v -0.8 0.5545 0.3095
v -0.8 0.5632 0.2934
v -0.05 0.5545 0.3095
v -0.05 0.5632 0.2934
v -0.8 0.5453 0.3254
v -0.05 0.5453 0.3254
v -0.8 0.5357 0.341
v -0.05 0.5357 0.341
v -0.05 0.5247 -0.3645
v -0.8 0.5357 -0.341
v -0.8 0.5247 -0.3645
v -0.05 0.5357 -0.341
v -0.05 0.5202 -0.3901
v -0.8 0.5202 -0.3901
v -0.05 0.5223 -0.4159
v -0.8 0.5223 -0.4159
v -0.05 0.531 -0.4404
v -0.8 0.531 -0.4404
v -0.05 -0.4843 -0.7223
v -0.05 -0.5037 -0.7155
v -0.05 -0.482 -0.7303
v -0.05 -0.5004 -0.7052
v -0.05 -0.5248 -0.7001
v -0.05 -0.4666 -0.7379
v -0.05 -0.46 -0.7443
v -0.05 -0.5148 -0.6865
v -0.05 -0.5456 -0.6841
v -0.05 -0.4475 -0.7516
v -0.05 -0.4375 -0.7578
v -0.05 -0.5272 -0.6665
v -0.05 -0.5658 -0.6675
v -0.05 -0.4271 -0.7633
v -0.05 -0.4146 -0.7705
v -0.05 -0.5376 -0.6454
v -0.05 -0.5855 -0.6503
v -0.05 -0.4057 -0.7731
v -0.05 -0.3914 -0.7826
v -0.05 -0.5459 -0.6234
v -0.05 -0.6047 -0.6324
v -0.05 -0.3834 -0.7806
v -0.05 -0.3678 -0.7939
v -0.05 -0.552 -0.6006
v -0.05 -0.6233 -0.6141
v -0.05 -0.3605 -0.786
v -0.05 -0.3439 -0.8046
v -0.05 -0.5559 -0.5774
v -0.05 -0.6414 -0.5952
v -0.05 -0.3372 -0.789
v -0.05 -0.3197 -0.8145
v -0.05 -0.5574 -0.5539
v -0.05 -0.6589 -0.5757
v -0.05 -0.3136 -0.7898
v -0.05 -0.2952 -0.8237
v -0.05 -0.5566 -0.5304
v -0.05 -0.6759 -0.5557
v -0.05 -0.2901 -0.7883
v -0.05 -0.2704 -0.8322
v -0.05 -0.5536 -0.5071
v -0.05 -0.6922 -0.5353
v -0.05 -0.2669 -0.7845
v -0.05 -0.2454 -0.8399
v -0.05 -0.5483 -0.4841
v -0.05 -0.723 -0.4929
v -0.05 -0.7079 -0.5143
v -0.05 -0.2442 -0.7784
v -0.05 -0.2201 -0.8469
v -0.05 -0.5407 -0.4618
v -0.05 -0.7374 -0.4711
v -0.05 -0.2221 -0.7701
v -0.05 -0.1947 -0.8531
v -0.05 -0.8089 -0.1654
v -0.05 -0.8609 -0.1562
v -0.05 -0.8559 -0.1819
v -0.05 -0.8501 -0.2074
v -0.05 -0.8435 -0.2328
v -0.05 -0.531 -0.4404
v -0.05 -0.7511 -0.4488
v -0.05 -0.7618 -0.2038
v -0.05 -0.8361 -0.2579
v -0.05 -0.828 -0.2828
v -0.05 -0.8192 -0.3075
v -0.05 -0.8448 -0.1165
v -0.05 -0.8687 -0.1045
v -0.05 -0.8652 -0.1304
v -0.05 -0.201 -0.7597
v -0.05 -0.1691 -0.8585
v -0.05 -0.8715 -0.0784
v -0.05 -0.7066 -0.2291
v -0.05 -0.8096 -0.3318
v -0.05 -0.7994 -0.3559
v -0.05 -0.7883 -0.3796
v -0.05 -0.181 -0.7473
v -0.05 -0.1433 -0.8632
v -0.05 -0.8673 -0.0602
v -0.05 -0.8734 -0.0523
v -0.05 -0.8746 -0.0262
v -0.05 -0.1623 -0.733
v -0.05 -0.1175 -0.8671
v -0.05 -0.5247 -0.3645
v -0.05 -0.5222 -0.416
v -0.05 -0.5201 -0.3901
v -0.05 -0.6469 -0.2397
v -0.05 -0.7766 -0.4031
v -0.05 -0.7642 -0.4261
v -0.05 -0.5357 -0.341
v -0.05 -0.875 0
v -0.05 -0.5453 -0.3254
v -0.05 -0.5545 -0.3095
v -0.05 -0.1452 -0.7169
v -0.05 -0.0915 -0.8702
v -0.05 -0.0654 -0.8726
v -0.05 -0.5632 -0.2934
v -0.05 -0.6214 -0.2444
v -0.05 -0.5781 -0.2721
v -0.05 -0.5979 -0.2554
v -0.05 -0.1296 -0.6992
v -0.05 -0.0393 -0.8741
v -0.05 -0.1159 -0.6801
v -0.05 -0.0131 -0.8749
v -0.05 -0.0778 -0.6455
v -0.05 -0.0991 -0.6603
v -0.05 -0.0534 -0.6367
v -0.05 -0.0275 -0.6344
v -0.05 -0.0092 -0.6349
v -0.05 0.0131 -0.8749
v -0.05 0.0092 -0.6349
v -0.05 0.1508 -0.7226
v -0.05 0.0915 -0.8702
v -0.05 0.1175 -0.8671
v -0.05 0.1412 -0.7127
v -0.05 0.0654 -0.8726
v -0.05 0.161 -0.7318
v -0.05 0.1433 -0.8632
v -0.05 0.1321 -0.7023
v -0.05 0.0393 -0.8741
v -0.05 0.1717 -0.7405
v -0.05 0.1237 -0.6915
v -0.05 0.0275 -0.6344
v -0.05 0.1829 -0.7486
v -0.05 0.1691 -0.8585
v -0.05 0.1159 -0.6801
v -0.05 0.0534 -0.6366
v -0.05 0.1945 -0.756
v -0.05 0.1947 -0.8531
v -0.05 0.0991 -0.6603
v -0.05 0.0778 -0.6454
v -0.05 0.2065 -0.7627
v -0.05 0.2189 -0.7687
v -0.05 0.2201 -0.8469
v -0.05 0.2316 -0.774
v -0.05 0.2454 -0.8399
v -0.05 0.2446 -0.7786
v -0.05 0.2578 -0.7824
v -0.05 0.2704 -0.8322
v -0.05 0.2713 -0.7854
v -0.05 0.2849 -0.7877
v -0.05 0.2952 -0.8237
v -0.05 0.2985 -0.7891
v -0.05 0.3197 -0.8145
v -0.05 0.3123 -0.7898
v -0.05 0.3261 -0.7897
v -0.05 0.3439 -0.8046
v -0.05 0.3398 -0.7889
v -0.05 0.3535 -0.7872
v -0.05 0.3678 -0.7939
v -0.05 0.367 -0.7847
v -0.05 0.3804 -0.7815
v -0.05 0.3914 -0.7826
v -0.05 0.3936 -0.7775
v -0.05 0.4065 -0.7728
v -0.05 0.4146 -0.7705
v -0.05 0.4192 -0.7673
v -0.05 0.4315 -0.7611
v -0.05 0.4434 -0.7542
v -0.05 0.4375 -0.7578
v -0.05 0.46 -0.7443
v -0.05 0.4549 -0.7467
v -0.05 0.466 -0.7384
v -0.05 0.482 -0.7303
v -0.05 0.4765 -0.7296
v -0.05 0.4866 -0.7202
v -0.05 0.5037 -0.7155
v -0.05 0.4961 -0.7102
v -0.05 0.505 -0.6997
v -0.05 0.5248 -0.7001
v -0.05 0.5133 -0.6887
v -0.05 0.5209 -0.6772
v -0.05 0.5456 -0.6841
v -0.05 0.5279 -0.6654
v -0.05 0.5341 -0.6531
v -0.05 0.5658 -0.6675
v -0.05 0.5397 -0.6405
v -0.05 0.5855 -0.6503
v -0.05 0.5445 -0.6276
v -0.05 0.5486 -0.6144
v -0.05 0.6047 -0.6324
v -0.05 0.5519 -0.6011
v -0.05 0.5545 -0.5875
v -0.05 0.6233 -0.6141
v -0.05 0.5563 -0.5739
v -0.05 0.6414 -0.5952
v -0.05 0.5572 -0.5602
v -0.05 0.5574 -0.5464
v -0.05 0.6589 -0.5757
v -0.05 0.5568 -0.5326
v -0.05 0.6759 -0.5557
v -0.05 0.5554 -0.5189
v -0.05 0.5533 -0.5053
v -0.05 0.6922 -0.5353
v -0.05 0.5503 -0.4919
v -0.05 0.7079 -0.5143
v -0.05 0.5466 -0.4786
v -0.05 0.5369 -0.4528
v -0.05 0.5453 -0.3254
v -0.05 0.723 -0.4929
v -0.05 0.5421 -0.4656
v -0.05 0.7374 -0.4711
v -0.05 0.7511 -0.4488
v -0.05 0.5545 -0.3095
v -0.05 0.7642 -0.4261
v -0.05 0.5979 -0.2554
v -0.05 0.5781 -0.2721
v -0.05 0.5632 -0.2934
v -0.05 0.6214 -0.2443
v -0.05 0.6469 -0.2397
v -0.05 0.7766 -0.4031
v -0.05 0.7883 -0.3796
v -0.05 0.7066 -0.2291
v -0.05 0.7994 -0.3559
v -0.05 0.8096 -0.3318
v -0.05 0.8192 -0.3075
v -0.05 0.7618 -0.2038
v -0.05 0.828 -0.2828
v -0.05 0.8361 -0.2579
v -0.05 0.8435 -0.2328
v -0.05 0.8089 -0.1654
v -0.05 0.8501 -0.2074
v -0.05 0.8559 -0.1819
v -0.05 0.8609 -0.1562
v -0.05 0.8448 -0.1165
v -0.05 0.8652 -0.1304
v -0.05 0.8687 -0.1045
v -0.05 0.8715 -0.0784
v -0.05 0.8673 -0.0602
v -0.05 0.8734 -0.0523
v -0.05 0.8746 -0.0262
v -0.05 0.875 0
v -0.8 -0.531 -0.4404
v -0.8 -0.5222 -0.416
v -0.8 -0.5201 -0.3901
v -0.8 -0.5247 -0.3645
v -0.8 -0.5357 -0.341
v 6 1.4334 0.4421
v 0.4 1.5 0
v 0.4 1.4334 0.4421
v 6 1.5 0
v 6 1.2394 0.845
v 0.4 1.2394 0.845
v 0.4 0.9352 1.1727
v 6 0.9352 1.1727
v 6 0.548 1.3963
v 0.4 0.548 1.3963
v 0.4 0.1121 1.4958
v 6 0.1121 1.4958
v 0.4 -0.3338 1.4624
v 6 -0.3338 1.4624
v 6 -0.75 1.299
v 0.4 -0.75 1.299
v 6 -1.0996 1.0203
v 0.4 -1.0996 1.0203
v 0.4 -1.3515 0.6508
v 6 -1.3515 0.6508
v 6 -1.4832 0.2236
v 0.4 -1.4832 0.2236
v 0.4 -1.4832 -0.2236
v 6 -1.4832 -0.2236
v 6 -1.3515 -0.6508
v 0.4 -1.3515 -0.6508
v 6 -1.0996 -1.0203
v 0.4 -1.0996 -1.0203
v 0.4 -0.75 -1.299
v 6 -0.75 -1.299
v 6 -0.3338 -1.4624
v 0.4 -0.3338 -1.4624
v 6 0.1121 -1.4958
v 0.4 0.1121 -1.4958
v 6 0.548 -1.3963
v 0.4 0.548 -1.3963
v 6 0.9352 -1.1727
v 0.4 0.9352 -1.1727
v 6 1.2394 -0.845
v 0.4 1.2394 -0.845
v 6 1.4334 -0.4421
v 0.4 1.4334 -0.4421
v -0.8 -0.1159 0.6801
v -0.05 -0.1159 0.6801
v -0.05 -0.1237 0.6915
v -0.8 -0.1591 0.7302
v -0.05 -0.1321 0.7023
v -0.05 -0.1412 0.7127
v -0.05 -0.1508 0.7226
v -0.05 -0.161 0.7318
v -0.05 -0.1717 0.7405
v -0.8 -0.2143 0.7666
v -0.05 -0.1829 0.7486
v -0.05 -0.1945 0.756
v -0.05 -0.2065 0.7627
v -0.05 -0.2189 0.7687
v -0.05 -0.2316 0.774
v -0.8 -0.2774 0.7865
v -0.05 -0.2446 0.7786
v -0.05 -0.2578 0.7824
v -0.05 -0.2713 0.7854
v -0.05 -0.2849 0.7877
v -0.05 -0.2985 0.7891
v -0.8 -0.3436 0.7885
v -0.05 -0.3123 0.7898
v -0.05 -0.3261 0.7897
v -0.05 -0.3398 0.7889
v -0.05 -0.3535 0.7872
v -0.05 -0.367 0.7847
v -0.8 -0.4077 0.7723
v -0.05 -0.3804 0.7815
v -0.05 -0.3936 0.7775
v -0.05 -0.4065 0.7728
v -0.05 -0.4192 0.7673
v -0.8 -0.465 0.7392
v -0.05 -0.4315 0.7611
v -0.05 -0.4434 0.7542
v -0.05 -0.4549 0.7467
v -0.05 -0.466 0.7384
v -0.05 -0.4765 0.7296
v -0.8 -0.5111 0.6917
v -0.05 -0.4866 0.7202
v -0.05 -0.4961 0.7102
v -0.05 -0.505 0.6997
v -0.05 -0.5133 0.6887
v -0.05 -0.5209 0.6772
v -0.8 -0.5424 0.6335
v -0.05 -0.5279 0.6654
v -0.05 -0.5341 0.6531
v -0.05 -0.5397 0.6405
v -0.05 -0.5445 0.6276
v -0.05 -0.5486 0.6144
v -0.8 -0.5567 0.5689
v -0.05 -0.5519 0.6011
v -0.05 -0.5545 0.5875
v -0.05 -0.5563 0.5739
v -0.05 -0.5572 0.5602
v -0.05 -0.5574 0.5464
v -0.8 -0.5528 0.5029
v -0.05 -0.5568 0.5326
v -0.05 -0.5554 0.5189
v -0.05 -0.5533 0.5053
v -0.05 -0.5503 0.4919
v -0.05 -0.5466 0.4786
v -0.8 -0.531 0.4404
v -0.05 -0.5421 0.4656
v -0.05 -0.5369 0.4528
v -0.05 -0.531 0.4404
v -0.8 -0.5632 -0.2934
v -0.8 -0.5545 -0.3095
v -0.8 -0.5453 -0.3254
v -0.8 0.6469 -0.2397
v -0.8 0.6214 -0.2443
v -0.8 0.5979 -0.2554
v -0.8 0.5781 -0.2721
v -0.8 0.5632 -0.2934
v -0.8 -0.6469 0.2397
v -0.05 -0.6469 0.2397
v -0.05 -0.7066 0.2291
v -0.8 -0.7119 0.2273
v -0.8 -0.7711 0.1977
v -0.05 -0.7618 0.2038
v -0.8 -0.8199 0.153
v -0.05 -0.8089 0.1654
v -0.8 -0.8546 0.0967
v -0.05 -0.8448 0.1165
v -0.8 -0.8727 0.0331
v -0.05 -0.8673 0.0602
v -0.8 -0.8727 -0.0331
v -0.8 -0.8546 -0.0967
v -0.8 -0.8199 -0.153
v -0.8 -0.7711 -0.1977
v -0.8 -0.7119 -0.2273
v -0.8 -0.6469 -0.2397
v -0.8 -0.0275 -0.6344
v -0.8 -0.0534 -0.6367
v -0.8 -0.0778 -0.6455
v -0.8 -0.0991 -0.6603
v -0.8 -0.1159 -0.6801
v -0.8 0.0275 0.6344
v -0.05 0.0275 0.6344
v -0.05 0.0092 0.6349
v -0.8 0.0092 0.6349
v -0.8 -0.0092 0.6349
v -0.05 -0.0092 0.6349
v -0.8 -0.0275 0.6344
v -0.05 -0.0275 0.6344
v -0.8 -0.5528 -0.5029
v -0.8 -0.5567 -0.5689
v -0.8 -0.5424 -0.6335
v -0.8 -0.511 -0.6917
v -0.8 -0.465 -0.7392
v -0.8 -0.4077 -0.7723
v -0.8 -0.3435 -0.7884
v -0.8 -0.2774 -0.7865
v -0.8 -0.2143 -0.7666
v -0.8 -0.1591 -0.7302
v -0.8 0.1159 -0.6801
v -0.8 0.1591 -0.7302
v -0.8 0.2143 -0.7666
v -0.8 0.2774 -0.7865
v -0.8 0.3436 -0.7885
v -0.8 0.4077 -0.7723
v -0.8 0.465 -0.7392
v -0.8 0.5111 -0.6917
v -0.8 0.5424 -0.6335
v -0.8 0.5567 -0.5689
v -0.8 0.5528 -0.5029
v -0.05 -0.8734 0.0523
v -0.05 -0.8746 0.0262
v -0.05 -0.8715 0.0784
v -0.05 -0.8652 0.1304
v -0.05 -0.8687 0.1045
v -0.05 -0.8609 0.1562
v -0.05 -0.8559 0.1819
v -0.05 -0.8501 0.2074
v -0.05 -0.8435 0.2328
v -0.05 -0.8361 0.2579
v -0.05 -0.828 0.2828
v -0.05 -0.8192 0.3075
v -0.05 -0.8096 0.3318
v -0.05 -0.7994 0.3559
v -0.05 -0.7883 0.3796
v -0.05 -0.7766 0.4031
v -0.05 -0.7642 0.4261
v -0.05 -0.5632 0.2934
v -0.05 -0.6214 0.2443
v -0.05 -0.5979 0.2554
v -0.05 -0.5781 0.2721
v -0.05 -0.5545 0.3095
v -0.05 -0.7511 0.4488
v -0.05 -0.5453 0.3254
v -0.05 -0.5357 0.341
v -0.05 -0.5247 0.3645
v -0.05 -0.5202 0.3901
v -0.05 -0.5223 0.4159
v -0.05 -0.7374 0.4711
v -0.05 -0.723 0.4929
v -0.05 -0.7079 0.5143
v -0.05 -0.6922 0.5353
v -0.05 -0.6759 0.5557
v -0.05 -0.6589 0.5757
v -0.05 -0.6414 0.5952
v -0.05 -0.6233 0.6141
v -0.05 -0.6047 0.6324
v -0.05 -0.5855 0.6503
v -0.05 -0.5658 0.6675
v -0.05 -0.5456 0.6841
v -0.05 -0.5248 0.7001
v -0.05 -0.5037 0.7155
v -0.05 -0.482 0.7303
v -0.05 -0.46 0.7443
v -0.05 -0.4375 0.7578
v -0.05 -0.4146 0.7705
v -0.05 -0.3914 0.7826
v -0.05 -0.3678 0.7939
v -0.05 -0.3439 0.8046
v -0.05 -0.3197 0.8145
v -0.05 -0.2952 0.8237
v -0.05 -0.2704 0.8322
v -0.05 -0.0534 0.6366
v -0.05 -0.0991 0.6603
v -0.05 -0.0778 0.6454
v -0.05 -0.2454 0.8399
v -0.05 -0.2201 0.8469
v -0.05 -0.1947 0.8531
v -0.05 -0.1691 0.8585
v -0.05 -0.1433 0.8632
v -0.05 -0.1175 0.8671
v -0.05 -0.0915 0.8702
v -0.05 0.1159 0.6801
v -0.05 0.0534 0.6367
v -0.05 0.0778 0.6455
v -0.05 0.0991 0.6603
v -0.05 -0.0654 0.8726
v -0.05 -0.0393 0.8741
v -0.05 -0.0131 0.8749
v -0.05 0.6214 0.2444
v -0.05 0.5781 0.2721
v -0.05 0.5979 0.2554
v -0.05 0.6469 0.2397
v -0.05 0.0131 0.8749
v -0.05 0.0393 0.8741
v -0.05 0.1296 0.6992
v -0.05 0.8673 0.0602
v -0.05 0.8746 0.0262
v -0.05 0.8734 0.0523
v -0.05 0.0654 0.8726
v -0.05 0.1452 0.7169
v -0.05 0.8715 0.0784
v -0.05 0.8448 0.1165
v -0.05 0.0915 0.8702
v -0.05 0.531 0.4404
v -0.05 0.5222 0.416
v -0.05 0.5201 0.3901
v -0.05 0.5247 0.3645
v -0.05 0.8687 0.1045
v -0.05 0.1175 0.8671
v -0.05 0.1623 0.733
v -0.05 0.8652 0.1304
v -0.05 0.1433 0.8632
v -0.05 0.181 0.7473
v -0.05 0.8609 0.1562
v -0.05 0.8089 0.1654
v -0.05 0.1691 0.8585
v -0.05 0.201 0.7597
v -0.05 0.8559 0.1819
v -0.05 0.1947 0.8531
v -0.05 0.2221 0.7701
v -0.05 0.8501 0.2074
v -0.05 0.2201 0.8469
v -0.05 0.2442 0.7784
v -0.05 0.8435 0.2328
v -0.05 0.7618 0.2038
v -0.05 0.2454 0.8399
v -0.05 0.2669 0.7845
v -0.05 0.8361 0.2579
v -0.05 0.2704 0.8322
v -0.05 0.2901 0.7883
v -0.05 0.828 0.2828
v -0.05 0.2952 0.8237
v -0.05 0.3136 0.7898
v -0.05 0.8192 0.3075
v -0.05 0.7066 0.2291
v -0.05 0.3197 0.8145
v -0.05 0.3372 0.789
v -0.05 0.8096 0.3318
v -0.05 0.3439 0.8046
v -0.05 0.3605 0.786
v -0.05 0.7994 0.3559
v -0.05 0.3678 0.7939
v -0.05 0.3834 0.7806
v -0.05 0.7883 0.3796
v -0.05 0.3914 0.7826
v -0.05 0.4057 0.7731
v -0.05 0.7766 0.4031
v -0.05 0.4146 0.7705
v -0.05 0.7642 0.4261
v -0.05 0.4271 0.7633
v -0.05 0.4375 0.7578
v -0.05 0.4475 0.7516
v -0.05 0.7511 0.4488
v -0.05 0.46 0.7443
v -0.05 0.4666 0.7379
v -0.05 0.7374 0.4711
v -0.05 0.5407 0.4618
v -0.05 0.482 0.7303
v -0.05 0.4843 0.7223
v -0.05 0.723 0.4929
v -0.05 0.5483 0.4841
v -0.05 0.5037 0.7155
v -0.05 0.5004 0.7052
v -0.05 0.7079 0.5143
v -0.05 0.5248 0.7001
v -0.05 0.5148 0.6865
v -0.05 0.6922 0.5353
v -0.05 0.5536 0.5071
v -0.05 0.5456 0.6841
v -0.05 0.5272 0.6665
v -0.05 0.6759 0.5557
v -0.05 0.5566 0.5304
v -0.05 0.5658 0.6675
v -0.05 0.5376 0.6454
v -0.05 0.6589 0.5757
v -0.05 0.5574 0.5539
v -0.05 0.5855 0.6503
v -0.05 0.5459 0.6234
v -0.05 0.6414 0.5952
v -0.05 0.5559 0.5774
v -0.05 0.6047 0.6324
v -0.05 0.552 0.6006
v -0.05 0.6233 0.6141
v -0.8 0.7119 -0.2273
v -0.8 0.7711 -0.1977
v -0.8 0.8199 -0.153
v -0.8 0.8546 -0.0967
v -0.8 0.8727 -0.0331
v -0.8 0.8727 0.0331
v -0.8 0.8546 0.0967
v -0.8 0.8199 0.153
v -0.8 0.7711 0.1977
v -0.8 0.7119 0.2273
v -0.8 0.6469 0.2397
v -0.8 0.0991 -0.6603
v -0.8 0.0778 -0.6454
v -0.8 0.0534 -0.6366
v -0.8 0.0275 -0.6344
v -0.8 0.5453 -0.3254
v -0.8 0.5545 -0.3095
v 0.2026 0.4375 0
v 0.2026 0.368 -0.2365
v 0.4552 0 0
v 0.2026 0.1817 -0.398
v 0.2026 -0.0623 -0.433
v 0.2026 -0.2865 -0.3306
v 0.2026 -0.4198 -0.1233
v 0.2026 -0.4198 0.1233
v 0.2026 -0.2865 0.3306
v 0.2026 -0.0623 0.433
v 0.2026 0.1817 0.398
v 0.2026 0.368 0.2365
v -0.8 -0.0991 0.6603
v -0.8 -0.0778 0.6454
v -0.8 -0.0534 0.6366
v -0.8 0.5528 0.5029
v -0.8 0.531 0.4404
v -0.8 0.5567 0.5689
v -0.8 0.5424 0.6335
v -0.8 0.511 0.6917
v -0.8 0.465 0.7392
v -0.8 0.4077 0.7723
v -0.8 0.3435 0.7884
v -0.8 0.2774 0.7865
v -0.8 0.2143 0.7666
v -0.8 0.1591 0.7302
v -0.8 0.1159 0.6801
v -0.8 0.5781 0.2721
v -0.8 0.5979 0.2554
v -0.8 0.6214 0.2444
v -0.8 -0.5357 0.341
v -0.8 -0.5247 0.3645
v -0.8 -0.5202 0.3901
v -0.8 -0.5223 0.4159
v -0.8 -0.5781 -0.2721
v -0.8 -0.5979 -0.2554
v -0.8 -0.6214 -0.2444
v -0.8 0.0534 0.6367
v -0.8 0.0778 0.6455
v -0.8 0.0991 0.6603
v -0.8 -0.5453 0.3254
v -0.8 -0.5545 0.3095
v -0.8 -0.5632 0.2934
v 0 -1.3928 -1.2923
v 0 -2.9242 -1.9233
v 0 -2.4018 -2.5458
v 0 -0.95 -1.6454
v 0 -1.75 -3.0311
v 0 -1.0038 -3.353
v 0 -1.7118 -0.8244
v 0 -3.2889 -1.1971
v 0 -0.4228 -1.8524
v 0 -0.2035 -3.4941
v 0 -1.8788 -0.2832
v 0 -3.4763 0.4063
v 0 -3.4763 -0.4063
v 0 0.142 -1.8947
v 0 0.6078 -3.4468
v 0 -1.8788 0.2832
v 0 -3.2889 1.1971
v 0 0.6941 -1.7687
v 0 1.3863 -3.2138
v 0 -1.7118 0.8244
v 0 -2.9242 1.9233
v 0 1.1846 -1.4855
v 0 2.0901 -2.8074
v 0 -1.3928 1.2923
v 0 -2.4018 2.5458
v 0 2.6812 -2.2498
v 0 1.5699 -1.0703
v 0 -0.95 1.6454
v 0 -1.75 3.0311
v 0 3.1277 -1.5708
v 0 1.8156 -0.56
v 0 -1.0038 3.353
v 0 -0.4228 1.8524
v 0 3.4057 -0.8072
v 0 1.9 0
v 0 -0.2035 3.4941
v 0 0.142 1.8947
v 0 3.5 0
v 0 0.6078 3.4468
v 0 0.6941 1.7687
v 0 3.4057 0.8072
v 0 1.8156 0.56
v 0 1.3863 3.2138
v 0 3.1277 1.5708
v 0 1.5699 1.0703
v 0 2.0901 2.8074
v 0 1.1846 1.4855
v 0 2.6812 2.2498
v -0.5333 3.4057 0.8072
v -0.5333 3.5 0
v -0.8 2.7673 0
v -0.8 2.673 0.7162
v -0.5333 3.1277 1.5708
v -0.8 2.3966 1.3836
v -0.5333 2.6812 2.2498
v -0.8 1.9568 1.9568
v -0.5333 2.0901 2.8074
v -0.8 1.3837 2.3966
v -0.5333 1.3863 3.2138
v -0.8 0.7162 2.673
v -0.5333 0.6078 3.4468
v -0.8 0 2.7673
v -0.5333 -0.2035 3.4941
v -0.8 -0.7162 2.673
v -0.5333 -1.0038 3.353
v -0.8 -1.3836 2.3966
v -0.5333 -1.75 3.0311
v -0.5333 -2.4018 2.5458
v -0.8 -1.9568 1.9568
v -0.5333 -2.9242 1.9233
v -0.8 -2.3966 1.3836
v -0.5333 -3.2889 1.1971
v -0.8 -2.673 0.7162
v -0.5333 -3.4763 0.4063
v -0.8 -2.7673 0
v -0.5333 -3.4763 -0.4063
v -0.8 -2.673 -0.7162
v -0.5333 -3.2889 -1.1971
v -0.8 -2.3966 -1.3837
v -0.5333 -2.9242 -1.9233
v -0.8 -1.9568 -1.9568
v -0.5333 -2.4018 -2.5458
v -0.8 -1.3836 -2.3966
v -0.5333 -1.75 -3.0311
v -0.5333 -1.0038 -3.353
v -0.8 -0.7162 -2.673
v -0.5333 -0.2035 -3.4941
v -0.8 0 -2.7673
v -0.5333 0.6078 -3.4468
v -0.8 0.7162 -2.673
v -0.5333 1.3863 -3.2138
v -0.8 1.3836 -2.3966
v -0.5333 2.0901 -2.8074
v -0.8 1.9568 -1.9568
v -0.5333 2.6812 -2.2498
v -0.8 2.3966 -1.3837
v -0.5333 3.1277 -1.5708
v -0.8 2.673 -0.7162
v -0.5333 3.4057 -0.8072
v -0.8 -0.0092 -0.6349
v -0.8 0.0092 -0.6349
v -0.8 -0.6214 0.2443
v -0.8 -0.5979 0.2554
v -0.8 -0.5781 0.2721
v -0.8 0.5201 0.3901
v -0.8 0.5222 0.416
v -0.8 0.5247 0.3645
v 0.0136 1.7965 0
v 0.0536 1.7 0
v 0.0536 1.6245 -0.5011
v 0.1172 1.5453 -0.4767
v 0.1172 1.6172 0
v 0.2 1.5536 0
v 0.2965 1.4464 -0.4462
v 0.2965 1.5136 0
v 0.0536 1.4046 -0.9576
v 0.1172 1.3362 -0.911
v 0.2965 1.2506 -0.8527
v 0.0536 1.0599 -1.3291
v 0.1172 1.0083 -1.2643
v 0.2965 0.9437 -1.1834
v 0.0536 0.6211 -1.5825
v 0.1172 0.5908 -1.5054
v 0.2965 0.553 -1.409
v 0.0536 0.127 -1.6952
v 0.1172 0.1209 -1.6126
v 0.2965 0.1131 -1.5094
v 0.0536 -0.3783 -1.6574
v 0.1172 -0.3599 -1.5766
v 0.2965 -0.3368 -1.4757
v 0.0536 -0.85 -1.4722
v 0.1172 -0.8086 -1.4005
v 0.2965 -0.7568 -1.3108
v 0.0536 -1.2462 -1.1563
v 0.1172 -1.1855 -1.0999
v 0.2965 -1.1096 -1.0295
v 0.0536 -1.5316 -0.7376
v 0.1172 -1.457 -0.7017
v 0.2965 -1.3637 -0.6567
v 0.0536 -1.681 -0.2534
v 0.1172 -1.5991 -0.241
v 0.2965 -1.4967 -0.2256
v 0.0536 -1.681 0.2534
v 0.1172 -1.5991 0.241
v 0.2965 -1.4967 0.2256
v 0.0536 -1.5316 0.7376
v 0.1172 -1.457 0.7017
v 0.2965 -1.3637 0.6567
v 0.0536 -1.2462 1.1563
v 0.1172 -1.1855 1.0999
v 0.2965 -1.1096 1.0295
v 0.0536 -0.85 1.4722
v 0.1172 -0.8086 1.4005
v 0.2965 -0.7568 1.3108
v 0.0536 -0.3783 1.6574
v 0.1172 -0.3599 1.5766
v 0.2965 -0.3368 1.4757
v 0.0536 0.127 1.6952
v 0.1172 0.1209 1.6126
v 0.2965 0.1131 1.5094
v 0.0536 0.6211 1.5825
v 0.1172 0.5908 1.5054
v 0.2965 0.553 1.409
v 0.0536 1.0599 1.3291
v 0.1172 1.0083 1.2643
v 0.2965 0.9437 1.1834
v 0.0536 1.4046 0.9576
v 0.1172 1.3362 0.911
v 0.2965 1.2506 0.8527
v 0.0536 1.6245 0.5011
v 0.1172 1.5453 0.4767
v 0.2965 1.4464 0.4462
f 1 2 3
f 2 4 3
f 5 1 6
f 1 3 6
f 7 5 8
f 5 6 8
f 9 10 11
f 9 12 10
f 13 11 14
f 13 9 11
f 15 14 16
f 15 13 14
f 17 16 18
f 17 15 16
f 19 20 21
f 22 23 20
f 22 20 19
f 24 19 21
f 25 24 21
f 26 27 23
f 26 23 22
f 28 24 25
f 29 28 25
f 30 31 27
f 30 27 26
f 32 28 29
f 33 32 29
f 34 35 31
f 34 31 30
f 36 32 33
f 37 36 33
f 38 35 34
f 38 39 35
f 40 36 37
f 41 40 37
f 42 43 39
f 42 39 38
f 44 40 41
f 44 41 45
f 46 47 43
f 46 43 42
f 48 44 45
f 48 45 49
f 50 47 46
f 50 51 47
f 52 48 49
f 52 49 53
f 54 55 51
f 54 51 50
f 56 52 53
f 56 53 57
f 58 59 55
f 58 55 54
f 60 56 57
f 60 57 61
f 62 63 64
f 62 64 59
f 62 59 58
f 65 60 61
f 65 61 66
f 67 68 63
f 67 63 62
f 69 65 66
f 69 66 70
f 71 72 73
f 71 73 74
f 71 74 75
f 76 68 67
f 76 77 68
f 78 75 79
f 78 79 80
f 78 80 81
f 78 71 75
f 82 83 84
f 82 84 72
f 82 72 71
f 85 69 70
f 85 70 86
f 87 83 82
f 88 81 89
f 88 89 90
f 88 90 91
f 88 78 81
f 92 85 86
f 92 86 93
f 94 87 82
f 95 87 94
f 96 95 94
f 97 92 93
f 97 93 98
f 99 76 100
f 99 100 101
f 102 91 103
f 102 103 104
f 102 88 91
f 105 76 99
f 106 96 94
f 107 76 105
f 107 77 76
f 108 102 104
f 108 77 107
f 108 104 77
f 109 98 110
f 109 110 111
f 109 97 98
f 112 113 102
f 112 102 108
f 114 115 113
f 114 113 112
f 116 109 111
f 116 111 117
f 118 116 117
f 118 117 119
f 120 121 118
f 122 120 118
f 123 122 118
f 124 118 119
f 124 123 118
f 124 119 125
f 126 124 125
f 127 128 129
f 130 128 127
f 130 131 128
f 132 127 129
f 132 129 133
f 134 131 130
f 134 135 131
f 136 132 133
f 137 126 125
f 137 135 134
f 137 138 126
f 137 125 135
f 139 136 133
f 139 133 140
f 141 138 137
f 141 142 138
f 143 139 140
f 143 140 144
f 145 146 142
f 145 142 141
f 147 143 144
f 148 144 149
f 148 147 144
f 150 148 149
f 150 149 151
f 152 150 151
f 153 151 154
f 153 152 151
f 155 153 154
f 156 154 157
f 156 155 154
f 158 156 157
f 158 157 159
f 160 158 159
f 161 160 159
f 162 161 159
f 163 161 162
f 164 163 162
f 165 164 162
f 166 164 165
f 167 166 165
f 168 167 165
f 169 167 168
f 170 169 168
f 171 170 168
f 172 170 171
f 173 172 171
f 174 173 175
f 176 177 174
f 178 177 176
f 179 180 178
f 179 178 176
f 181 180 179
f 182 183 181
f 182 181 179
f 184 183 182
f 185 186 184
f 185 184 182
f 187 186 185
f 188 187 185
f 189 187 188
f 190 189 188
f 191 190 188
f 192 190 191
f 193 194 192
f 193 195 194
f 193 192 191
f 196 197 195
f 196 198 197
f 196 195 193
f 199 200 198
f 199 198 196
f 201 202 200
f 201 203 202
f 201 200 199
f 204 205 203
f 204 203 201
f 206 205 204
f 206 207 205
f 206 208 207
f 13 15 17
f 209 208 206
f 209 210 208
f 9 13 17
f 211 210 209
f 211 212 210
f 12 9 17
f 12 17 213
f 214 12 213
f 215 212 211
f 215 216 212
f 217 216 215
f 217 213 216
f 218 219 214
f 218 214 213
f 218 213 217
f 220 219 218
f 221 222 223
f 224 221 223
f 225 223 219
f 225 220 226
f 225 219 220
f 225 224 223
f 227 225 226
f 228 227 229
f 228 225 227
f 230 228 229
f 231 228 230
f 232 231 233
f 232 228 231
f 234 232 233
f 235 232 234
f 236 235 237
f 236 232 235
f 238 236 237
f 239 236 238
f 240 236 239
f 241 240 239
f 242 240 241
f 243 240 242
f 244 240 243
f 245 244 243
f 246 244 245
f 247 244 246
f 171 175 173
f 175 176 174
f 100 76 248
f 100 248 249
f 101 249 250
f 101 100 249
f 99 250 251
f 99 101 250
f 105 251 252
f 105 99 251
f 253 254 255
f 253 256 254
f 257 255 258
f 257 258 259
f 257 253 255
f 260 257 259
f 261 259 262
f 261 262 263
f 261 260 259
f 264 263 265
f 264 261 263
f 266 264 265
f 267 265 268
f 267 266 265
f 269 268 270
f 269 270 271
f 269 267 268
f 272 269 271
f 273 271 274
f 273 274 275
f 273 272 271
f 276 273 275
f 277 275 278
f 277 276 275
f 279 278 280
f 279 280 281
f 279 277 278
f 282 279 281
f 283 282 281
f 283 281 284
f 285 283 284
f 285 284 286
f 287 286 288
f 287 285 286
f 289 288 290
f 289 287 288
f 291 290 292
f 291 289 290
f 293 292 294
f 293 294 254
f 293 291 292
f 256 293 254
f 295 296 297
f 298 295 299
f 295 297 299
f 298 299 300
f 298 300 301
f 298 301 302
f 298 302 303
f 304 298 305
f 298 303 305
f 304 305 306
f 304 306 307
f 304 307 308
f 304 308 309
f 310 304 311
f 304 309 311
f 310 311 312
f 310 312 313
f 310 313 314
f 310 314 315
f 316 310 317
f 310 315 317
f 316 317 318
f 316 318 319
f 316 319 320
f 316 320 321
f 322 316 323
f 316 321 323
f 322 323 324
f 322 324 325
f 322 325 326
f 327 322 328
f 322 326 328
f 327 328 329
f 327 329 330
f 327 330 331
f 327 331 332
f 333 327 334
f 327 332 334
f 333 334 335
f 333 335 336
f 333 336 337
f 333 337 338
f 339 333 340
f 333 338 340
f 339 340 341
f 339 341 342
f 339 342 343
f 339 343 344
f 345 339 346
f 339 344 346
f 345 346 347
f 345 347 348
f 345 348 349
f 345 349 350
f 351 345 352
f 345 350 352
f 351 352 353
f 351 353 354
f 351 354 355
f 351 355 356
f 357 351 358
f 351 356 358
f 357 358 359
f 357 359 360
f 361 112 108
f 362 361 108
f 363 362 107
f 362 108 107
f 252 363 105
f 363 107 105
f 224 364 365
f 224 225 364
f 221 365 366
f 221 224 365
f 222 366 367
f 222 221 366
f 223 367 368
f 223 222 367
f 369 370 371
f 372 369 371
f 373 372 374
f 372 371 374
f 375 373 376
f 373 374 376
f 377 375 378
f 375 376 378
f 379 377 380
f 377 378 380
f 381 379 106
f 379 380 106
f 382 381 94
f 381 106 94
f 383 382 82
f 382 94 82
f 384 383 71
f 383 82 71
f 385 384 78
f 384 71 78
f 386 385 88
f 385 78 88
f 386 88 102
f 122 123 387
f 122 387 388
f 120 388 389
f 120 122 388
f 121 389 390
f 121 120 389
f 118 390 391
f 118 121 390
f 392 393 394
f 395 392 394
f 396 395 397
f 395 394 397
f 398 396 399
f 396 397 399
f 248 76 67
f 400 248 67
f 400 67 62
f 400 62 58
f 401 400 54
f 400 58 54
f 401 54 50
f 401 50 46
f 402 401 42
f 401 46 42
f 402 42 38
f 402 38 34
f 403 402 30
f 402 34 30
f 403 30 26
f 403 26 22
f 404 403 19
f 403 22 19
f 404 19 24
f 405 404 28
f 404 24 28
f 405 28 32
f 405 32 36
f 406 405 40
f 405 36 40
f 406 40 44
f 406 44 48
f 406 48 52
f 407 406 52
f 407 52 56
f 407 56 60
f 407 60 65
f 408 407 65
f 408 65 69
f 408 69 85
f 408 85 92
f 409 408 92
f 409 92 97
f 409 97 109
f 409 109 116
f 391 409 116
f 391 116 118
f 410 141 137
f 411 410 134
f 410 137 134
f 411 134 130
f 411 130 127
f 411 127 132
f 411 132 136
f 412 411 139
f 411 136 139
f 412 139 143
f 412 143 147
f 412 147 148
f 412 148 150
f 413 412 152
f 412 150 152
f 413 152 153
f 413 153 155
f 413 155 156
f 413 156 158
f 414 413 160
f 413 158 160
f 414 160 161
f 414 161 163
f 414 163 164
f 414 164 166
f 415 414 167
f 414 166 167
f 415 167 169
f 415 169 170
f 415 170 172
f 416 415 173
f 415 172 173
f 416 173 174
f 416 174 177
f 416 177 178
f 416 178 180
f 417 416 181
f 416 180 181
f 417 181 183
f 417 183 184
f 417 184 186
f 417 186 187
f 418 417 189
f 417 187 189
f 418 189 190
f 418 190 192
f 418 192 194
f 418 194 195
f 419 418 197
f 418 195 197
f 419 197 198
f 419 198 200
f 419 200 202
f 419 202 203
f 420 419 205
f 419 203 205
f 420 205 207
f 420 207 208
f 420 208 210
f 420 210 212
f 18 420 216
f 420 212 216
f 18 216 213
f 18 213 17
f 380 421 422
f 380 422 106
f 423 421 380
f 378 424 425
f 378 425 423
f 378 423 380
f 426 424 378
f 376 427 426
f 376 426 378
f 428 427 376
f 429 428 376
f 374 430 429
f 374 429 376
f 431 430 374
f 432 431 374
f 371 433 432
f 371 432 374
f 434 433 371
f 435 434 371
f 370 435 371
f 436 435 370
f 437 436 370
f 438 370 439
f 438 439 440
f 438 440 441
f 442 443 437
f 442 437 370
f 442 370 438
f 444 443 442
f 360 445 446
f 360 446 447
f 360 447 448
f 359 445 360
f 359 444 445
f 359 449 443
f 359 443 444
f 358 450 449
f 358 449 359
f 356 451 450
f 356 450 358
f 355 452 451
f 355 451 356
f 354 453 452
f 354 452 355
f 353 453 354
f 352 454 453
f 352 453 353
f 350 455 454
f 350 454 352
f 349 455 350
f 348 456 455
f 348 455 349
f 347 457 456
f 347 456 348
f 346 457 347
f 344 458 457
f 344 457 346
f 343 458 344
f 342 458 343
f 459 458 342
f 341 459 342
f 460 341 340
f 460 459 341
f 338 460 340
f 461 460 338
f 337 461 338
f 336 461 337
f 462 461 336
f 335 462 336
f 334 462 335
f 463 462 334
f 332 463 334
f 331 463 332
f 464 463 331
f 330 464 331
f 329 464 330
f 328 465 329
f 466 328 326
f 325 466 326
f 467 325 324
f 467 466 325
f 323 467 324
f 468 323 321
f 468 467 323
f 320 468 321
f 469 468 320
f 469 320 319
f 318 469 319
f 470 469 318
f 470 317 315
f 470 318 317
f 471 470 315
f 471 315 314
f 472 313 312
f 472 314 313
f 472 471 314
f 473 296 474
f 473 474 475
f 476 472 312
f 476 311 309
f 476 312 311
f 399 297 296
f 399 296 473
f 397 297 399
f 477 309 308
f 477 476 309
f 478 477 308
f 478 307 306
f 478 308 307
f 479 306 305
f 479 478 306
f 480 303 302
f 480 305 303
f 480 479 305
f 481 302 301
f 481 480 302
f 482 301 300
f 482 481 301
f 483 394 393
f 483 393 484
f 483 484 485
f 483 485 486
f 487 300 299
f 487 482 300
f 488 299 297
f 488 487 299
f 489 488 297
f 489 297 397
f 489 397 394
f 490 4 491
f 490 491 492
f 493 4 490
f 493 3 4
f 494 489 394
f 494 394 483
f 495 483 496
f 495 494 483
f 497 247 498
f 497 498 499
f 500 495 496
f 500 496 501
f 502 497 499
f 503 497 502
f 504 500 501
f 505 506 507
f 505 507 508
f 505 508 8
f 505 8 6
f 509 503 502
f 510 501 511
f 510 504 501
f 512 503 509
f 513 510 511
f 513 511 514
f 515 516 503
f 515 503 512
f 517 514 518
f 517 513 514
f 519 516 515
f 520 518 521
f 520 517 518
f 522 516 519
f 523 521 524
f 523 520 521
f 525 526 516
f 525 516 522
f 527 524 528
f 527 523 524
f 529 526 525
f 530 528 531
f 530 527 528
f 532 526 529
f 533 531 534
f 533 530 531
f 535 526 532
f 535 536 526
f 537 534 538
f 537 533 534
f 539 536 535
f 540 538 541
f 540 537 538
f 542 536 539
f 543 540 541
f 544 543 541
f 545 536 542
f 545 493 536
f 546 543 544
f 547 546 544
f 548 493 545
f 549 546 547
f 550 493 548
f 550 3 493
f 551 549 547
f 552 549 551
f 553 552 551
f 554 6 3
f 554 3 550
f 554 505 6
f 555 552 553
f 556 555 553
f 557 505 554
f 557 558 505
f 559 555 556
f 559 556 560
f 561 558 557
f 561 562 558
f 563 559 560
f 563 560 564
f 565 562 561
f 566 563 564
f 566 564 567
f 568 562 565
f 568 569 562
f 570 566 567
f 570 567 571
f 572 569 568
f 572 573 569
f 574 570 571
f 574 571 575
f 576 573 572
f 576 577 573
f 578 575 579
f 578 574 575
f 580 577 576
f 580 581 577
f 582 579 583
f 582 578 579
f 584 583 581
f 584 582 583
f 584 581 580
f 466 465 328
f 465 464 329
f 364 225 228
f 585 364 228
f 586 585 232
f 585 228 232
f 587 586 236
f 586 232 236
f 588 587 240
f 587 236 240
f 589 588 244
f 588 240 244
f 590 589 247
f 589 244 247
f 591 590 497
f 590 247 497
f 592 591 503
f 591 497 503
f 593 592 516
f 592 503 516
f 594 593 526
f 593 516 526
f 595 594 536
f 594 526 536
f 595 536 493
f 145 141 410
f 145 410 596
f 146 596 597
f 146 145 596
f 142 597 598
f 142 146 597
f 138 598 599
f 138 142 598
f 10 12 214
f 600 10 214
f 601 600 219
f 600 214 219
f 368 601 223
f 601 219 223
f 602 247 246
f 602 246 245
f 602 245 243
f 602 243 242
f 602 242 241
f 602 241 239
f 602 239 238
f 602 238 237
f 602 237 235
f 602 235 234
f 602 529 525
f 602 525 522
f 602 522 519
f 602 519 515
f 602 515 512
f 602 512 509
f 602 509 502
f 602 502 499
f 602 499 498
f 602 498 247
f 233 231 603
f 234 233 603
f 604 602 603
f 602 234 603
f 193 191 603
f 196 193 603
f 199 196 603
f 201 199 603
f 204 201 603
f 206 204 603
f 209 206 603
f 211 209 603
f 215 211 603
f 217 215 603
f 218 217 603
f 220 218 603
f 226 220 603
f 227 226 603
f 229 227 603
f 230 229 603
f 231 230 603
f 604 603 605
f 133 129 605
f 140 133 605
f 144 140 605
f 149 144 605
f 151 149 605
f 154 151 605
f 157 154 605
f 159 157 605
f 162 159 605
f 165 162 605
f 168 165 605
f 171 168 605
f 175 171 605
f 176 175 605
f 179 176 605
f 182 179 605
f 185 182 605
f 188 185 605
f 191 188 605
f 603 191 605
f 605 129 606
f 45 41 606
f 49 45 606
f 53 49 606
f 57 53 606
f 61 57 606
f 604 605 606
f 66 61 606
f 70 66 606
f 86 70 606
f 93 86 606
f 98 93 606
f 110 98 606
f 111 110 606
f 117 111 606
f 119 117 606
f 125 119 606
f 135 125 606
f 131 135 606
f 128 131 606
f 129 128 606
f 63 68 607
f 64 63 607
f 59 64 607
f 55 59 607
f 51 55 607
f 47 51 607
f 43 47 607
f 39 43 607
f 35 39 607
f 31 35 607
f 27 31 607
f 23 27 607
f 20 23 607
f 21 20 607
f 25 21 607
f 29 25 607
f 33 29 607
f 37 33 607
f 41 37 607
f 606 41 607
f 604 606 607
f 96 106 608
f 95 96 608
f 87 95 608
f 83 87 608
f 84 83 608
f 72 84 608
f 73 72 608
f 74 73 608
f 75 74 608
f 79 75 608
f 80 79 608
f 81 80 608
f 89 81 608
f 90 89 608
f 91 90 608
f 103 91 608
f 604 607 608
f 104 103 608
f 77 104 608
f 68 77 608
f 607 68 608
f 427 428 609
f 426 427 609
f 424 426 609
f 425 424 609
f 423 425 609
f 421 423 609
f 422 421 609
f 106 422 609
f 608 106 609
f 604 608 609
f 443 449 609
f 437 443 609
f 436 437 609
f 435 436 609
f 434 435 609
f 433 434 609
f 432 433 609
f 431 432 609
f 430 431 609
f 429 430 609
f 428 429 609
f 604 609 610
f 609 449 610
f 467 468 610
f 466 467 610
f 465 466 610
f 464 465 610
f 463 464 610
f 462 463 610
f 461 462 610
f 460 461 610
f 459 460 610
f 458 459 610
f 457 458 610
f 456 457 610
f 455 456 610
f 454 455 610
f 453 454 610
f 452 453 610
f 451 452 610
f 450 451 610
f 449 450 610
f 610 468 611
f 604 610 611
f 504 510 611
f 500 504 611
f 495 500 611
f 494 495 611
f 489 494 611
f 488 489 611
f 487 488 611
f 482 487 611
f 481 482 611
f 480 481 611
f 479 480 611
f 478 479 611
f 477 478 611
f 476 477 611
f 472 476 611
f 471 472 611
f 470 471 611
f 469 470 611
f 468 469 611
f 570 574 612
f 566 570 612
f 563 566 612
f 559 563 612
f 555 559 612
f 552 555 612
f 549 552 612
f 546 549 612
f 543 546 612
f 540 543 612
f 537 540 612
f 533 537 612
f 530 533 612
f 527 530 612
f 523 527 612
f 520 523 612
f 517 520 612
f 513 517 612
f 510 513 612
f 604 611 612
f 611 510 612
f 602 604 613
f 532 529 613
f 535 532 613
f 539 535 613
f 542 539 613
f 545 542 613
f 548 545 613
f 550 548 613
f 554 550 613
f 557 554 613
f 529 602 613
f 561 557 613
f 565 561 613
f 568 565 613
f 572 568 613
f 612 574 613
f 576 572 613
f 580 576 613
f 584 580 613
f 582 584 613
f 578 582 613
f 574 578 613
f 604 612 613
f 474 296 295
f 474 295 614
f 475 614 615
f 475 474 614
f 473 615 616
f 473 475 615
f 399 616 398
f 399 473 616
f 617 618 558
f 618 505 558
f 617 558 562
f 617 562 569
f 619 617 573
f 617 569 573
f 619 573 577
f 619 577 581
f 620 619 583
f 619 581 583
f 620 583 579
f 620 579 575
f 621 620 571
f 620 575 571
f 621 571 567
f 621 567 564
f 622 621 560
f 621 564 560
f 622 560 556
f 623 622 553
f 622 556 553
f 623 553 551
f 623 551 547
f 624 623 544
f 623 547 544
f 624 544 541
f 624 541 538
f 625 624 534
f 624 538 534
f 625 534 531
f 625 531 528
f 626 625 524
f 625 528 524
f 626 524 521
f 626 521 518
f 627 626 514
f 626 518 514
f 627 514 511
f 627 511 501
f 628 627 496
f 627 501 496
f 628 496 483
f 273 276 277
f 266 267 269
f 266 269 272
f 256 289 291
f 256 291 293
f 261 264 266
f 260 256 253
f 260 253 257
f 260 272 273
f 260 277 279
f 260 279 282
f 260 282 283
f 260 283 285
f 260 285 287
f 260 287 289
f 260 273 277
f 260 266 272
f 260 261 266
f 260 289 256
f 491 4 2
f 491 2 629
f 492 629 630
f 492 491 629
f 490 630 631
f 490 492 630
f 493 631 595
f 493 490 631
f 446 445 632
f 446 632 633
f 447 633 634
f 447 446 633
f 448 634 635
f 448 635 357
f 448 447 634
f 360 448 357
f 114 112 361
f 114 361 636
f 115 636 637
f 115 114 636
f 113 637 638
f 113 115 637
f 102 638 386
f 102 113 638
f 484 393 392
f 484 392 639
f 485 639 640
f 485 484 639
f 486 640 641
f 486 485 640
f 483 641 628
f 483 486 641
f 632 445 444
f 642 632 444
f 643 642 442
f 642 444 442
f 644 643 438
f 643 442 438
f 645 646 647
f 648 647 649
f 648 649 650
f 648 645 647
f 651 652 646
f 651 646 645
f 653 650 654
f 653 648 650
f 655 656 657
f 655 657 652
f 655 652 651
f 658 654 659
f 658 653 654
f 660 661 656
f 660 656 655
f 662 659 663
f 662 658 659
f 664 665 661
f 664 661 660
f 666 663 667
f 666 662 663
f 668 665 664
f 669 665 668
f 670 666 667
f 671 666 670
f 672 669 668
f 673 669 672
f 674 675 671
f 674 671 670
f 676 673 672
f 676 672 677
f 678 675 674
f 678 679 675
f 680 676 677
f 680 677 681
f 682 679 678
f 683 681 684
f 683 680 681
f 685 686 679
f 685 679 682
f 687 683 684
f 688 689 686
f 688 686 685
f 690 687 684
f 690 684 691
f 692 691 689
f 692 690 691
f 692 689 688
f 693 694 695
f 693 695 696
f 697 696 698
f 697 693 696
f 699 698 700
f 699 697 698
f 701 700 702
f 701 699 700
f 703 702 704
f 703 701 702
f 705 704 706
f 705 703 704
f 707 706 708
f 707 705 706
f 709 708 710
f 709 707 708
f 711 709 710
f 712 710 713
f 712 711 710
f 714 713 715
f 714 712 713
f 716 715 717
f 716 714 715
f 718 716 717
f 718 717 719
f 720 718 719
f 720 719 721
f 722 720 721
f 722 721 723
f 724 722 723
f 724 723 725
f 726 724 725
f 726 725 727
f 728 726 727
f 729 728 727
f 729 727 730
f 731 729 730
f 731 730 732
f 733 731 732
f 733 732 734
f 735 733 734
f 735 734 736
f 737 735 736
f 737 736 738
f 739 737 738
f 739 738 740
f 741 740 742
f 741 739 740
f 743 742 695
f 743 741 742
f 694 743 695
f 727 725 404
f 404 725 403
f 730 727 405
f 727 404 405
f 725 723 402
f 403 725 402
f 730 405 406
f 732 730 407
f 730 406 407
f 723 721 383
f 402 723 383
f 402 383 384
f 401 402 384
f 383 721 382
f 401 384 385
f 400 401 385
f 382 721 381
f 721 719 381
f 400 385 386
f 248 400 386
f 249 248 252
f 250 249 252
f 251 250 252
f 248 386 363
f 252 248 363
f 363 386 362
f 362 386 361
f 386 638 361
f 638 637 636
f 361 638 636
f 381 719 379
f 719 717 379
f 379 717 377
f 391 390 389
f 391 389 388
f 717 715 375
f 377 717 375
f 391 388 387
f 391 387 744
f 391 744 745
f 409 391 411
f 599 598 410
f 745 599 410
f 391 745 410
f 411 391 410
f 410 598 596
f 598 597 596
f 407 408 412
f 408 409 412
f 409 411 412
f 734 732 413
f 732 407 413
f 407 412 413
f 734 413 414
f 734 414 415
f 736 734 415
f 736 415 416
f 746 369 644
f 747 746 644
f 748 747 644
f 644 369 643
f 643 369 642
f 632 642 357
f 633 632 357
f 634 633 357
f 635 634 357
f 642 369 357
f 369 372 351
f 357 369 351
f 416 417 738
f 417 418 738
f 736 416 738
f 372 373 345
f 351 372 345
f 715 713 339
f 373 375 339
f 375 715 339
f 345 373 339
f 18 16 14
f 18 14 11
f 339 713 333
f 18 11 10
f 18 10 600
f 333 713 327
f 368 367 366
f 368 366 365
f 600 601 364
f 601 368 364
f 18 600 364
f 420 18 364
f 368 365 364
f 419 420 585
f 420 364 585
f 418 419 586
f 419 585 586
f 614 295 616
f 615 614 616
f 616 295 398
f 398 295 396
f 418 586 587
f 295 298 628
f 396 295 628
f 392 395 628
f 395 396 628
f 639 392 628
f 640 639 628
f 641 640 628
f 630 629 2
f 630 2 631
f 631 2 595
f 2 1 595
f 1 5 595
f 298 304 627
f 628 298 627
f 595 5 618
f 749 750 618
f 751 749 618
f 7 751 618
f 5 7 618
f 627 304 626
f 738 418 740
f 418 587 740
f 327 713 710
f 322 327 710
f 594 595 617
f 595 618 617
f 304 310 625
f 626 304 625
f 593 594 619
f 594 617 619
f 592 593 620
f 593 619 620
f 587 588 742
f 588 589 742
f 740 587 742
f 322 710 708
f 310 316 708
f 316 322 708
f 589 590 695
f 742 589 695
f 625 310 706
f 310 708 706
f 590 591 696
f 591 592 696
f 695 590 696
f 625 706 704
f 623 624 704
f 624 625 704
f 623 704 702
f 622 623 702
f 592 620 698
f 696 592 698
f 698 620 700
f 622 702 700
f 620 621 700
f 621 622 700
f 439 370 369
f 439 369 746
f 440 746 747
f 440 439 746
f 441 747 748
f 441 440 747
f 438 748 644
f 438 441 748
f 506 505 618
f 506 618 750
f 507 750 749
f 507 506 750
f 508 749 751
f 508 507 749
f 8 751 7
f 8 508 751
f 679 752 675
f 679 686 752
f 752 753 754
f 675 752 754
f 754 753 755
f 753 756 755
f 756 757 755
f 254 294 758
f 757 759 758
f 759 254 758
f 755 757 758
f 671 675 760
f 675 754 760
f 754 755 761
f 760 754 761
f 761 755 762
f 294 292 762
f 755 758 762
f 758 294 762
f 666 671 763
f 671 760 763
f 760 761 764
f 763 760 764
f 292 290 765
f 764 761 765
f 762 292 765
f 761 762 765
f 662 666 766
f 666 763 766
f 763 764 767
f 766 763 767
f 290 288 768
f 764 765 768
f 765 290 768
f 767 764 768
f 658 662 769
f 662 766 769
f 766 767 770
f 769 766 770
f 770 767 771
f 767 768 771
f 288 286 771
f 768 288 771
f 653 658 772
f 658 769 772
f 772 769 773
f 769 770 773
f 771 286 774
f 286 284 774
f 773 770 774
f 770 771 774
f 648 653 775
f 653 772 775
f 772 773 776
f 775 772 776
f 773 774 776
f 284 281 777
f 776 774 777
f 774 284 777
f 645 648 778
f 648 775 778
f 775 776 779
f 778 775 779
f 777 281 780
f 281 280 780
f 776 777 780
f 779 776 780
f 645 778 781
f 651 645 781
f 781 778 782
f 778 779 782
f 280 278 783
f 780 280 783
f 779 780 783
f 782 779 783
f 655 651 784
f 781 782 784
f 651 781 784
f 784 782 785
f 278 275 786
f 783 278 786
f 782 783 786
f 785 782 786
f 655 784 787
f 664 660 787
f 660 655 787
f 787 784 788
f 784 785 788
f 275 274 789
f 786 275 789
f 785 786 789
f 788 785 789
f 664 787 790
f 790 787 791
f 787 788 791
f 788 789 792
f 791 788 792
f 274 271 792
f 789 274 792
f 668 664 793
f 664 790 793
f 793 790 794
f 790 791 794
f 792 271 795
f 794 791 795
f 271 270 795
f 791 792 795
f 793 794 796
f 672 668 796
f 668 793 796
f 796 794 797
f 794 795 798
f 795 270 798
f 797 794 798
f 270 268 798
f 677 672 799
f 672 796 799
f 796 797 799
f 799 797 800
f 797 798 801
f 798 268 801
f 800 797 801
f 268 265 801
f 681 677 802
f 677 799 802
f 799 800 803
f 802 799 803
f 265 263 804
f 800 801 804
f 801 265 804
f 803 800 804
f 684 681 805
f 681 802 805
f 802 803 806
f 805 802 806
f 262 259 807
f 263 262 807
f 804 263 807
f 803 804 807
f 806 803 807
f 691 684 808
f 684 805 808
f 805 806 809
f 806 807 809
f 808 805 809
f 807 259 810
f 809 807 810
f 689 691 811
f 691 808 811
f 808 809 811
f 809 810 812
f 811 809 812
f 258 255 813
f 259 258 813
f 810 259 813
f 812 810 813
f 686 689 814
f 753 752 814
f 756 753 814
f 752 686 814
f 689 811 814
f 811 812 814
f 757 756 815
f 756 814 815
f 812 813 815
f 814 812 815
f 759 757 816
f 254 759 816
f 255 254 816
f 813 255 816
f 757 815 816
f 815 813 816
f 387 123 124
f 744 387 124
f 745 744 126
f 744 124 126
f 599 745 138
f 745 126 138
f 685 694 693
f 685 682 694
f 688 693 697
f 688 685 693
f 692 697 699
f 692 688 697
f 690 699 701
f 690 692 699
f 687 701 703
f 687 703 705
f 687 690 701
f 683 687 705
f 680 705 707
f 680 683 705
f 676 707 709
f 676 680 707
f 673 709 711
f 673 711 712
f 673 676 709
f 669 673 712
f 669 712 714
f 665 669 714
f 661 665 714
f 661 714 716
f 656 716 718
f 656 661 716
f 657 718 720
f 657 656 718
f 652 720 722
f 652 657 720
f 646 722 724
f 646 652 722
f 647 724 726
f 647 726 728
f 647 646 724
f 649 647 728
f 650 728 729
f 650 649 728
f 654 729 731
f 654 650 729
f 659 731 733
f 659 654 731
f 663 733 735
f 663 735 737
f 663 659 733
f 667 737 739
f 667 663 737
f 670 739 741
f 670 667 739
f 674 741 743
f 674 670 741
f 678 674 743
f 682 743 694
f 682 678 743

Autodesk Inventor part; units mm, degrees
ref_plane "YZ Plane" through (0, 0, 0) normal (1, 0, 0) x (0, 1, 0)
ref_plane "XZ Plane" through (0, 0, 0) normal (0, 1, 0) x (-1, 0, 0)
ref_plane "XY Plane" through (0, 0, 0) normal (0, 0, 1) x (1, 0, 0)
sketch "Sketch_1" plane through (0, 0, 0) normal (0, 0, 1) x (1, 0, 0)
  line L0 (6, 0) -> (-0.8, 0)
  line L1 (-0.8, 0) -> (-0.8, 2.7673)
  line L2 (-0.8, 2.7673) -> (-0.5333, 3.5)
  line L3 (-0.5333, 3.5) -> (0, 3.5)
  line L4 (0, 3.5) -> (0, 1.9)
  arc A0 (0, 1.9) -> (0.4, 1.5) centre (0.4, 1.9) ccw
  line L5 (0.4, 1.5) -> (6, 1.5)
  line L6 (6, 1.5) -> (6, 0)
  line L7 (6, 0) -> (-0.8, 0)
revolve "Revolution1" add sketch "Sketch_1" angle 360 about axis through (6, 0, 0) along (1, 0, 0)
thread "Thread1" size "M3x0.5" class "6g" standard "ISO Metric profile" length 5.5 offset 0.1
sketch "Sketch_5" plane through (-0.05, 0, 0) normal (1, 0, 0) x (0, 0, -1)
  arc A0 (-0.6801, -0.1159) -> (-0.4404, -0.531) centre (-0.5499, -0.3175) ccw
  arc A1 (-0.341, -0.5357) -> (-0.4404, -0.531) centre (-0.3947, -0.62) ccw
  arc A2 (-0.341, -0.5357) -> (-0.2934, -0.5632) centre (0, 0) ccw
  arc A3 (-0.2397, -0.6469) -> (-0.2934, -0.5632) centre (-0.3396, -0.6519) ccw
  arc A4 (-0.2397, -0.6469) -> (0.2397, -0.6469) centre (0, -0.635) ccw
  arc A5 (0.2934, -0.5632) -> (0.2397, -0.6469) centre (0.3396, -0.6519) ccw
  arc A6 (0.2934, -0.5632) -> (0.341, -0.5357) centre (0, 0) ccw
  arc A7 (0.4404, -0.531) -> (0.341, -0.5357) centre (0.3947, -0.62) ccw
  arc A8 (0.4404, -0.531) -> (0.6801, -0.1159) centre (0.5499, -0.3175) ccw
  arc A9 (0.6344, -0.0275) -> (0.6801, -0.1159) centre (0.7343, -0.0318) ccw
  arc A10 (0.6344, -0.0275) -> (0.6344, 0.0275) centre (0, 0) ccw
  arc A11 (0.6801, 0.1159) -> (0.6344, 0.0275) centre (0.7343, 0.0318) ccw
  arc A12 (0.6801, 0.1159) -> (0.4404, 0.531) centre (0.5499, 0.3175) ccw
  arc A13 (0.341, 0.5357) -> (0.4404, 0.531) centre (0.3947, 0.62) ccw
  arc A14 (0.341, 0.5357) -> (0.2934, 0.5632) centre (0, 0) ccw
  arc A15 (0.2397, 0.6469) -> (0.2934, 0.5632) centre (0.3396, 0.6519) ccw
  arc A16 (0.2397, 0.6469) -> (-0.2397, 0.6469) centre (0, 0.635) ccw
  arc A17 (-0.2934, 0.5632) -> (-0.2397, 0.6469) centre (-0.3396, 0.6519) ccw
  arc A18 (-0.2934, 0.5632) -> (-0.341, 0.5357) centre (0, 0) ccw
  arc A19 (-0.4404, 0.531) -> (-0.341, 0.5357) centre (-0.3947, 0.62) ccw
  arc A20 (-0.4404, 0.531) -> (-0.6801, 0.1159) centre (-0.5499, 0.3175) ccw
  arc A21 (-0.6344, 0.0275) -> (-0.6801, 0.1159) centre (-0.7343, 0.0318) ccw
  arc A22 (-0.6344, 0.0275) -> (-0.6344, -0.0275) centre (0, 0) ccw
  arc A23 (-0.6801, -0.1159) -> (-0.6344, -0.0275) centre (-0.7343, -0.0318) ccw
extrude "Extrusion1" cut sketch "Sketch_5" against normal blind 0.75
sketch "Sketch_2" plane through (0, 0, 0) normal (0, 0, 1) x (1, 0, 0)
  line L0 (0.4552, 0) -> (0, 0)
  line L1 (-0.05, 0) -> (-0.05, 0.875)
  line L2 (-0.05, 0.875) -> (0.4552, 0)
  line L3 (0.4552, 0) -> (-0.05, 0)
revolve "Revolution2" cut sketch "Sketch_2" angle 360 about axis through (0.4552, 0, 0) along (1, 0, 0)
properties part number "超極低頭ネジL6" material "ステンレス鋼"
